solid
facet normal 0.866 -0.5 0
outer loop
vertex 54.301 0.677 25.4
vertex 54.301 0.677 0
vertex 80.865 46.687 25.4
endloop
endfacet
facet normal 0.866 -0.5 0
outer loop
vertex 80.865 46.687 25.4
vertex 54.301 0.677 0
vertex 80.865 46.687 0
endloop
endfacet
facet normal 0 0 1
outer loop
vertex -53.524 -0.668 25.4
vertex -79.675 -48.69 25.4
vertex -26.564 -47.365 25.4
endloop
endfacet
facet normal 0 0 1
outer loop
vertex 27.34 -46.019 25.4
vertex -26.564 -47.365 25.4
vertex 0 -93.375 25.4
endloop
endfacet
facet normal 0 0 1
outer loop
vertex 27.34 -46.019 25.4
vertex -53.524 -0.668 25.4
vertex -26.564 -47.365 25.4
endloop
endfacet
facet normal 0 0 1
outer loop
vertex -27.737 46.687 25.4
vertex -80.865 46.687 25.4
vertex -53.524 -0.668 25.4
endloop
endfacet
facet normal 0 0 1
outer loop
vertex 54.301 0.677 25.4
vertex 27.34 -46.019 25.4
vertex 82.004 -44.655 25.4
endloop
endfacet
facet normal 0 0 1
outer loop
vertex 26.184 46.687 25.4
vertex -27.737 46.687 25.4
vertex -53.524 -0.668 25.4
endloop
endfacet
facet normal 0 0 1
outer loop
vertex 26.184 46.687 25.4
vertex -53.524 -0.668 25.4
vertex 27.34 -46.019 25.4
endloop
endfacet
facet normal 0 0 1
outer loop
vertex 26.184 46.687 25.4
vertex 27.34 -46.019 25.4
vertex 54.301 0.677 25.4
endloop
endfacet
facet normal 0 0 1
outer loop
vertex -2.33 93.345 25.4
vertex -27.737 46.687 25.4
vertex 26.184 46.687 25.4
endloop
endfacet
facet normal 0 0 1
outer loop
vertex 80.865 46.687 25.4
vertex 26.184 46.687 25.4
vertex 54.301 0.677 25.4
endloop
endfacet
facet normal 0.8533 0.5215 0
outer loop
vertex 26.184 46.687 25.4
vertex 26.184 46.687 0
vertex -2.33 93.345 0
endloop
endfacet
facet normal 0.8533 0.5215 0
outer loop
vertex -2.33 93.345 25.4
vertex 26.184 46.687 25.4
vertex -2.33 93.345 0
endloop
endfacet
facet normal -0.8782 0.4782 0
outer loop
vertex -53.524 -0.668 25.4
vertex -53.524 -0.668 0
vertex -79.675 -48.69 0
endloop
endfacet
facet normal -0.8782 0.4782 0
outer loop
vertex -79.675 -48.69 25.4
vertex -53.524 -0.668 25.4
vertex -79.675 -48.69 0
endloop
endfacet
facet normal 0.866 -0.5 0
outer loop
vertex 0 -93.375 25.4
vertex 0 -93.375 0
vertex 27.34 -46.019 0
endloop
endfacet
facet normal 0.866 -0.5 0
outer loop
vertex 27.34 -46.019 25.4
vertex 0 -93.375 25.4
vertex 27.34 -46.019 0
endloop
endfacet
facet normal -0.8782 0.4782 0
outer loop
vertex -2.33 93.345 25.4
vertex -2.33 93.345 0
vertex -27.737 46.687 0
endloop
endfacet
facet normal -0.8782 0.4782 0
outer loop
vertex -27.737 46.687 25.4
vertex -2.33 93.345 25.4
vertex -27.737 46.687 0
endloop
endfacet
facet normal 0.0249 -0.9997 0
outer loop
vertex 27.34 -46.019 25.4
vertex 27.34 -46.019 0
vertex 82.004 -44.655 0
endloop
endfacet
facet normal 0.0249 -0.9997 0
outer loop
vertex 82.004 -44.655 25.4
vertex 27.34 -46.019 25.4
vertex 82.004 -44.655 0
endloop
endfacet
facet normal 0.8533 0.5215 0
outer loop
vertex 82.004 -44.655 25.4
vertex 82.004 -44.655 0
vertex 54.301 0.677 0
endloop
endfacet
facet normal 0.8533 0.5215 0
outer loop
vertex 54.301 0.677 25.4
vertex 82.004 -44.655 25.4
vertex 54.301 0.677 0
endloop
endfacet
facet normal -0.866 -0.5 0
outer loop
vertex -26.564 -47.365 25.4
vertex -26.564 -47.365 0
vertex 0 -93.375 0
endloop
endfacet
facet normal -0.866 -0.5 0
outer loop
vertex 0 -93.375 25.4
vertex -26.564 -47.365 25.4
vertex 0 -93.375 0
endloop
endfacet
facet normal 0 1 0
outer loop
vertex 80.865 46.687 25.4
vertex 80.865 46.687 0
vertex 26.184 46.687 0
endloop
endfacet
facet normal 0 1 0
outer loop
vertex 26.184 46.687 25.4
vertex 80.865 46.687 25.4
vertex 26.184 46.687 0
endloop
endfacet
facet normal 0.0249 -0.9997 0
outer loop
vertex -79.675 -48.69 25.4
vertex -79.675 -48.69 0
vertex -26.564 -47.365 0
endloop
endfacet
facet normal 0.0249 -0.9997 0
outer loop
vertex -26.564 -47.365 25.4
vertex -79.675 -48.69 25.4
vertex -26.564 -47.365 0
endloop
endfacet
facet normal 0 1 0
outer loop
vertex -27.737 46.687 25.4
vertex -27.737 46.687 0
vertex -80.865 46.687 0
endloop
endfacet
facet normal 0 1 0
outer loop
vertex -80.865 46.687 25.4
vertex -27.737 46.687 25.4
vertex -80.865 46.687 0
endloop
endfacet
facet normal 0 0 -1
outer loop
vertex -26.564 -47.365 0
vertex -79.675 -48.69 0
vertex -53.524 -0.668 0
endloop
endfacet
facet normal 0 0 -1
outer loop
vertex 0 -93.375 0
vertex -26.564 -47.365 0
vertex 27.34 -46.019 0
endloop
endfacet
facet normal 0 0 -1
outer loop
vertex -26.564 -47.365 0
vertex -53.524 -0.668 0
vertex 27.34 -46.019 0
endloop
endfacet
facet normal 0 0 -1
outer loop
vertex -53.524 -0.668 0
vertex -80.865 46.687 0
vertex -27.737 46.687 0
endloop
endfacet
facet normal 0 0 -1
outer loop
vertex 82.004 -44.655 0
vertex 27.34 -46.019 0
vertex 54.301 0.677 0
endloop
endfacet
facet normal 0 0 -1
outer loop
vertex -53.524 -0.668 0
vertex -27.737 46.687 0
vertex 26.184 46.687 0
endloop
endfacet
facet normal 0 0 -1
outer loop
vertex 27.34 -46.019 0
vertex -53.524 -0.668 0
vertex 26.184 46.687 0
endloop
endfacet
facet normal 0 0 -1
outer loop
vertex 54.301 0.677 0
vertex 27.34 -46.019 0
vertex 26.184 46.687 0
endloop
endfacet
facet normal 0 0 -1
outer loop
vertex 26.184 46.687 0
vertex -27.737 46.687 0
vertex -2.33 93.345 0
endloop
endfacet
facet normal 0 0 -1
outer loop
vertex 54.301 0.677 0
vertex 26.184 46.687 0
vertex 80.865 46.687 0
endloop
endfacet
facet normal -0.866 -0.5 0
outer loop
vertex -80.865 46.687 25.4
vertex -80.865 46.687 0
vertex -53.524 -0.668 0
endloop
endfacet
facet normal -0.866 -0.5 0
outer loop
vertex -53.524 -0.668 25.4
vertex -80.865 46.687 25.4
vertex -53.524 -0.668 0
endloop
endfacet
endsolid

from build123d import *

# Parameters (mm, degrees)
F1_DEPTH = 25.4


with BuildPart() as f1:
    # F0 (on Top) → F1 (new body)
    with BuildSketch(Plane.XY):
        Polygon((-53.5242615514, -0.6677641515), (-27.7371538567, 46.6872522981), (-80.864693046, 46.6872522981), align=None)
        Polygon((26.1838300567, 46.6872522981), (-2.3295022303, 93.3454419237), (-27.7371538567, 46.6872522981), align=None)
        Polygon((80.864693046, 46.6872522981), (26.1838300567, 46.6872522981), (54.3009234514, 0.6774537196), align=None)
        Polygon((82.0042751486, -44.6553128522), (54.3009234514, 0.6774537196), (27.3404314946, -46.0194881465), align=None)
        Polygon((-26.5637695946, -47.3647060176), (-53.5242615514, -0.6677641515), (-79.6747729182, -48.6901290715), align=None)
        Polygon((0, -93.3745045961), (27.3404314946, -46.0194881465), (-26.5637695946, -47.3647060176), align=None)
        Polygon((54.3009234514, 0.6774537196), (26.1838300567, 46.6872522981), (-27.7371538567, 46.6872522981), (-53.5242615514, -0.6677641515), (-26.5637695946, -47.3647060176), (27.3404314946, -46.0194881465), align=None)
    extrude(amount=F1_DEPTH)


solid = f1.part
